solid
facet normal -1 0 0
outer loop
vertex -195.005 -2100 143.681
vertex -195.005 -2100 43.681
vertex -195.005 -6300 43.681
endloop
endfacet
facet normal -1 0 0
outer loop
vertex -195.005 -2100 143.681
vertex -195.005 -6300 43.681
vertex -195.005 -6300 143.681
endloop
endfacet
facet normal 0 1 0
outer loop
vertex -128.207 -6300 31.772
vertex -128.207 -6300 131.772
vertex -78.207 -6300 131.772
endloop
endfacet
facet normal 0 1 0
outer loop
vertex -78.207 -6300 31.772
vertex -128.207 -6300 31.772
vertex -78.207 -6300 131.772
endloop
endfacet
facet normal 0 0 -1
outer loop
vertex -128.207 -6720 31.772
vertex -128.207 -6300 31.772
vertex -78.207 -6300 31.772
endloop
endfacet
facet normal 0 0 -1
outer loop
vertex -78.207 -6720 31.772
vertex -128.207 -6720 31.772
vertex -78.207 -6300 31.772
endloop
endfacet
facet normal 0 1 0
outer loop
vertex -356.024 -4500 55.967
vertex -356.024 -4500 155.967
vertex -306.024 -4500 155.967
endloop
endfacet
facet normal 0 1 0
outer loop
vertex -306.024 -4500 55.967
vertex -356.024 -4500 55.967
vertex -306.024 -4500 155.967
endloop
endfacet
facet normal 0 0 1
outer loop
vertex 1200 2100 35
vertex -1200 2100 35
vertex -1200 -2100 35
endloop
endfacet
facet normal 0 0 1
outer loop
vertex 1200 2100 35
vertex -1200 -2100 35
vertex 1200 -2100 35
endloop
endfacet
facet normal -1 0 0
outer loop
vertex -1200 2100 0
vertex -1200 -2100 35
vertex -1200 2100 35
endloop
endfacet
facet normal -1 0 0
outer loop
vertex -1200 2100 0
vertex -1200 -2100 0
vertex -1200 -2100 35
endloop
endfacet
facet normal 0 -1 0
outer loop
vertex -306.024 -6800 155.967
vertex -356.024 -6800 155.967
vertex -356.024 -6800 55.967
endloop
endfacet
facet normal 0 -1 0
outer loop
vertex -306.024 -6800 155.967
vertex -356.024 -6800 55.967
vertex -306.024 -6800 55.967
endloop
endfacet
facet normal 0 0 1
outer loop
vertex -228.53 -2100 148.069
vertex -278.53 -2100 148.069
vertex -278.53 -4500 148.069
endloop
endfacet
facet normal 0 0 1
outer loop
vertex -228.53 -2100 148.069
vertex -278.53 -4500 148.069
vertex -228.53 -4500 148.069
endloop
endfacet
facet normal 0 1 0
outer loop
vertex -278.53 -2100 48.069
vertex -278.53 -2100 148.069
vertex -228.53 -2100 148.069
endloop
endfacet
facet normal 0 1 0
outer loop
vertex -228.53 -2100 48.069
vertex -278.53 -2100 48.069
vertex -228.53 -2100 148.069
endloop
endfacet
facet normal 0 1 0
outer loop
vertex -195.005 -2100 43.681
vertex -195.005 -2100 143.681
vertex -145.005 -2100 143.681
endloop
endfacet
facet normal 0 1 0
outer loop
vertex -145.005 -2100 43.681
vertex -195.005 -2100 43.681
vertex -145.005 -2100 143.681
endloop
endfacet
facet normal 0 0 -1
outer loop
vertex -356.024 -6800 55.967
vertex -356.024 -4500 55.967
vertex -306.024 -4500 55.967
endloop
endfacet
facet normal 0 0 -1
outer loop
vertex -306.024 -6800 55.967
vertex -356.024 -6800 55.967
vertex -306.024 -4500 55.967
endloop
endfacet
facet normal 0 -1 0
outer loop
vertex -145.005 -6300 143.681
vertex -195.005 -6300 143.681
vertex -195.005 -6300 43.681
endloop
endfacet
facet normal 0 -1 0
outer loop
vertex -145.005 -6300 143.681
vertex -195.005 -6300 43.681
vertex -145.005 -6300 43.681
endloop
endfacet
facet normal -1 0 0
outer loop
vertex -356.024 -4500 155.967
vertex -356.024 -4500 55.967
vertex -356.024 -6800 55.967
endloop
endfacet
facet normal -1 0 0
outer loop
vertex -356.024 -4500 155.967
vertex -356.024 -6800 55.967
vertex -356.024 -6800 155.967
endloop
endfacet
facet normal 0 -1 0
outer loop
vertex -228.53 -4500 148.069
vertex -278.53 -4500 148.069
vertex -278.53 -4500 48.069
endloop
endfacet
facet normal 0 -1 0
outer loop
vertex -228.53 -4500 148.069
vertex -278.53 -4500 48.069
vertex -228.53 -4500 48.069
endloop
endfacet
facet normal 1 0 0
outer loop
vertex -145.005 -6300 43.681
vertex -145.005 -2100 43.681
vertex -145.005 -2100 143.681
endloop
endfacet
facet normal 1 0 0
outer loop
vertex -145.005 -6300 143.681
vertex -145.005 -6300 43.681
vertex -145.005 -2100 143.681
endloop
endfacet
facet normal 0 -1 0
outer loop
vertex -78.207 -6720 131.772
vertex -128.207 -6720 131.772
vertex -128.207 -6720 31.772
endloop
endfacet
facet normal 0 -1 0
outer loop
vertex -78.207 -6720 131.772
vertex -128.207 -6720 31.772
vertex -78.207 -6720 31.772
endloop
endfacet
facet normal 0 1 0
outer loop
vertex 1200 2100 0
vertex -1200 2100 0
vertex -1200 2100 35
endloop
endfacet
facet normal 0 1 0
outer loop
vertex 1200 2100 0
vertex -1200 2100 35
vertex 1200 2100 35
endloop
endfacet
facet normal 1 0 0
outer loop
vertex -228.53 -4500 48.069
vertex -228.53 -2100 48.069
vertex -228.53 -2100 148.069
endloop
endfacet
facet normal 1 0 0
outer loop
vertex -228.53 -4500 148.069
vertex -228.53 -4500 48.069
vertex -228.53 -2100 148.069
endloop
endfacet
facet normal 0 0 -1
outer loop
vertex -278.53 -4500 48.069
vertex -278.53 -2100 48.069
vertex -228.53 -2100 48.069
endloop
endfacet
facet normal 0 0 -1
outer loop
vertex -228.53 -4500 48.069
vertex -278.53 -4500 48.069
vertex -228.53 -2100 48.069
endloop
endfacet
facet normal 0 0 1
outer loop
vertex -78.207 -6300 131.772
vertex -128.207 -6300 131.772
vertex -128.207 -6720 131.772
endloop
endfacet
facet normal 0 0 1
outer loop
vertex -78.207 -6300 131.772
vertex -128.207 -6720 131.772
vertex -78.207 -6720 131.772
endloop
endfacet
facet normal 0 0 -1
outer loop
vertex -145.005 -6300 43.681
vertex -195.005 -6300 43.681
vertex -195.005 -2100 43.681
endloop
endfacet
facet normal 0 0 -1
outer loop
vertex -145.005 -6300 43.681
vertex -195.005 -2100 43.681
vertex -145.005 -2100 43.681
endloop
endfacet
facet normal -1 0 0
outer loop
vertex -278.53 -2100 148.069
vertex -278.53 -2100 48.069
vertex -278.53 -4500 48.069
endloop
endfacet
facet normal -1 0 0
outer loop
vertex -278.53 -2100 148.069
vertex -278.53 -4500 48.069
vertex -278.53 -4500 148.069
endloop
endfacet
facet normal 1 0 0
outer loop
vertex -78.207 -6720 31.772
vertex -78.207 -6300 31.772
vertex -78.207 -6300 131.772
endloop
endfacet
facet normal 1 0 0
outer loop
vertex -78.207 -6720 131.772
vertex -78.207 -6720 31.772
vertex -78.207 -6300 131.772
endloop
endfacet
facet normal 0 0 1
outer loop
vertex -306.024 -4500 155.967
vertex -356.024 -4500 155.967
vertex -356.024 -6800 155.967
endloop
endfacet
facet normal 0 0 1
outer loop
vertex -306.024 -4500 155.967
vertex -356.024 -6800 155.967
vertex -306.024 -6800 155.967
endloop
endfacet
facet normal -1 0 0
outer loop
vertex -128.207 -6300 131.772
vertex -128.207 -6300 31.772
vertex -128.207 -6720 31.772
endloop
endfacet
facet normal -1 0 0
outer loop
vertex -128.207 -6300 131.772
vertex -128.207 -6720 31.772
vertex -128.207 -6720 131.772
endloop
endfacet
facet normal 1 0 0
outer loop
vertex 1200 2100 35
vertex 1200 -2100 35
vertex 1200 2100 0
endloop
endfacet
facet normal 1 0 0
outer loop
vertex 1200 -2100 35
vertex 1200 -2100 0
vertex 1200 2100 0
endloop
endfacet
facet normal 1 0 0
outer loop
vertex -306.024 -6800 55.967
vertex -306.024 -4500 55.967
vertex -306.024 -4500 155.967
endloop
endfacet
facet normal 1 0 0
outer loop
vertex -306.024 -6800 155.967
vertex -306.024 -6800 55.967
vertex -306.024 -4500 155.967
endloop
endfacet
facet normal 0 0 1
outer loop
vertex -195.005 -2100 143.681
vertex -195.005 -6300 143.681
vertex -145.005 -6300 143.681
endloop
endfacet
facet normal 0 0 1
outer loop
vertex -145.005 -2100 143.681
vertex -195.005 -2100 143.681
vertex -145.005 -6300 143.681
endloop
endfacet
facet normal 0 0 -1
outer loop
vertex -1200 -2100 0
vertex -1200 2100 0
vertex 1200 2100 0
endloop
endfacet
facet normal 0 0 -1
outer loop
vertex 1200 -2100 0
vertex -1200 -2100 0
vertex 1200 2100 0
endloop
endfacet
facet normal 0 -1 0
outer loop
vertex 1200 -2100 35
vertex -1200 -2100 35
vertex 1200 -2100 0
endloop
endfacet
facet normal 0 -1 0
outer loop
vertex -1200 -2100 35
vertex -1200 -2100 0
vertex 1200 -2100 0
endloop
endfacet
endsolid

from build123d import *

# Parameters (mm, degrees)
F0_W      = 2400
F0_H      = 4200
F1_DEPTH  = 10
F2_W      = 2400
F2_H      = 4200
F4_DEPTH  = 25
F3_W      = 50
F3_H      = 100
F6_DEPTH  = 4200
F7_W      = 50
F7_H      = 100
F8_DEPTH  = 2400
F9_W      = 50
F9_H      = 100
F10_DEPTH = 420
F11_W     = 50
F11_H     = 100
F12_DEPTH = 2300


with BuildPart() as f1:
    # F0 (on Top) → F1 (new body)
    with BuildSketch(Plane.XY):
        Rectangle(F0_W, F0_H)
    extrude(amount=F1_DEPTH)

    # F2 (on face) → F4 (join)
    with BuildSketch(Plane.XY.offset(10)):
        Rectangle(F2_W, F2_H)
    extrude(amount=F4_DEPTH)


with BuildPart() as f6:
    # F3 (on face) → F6 (new body)
    with BuildSketch(Plane.XZ.offset(2100)):
        with Locations((-170.005275, 93.681164)):
            Rectangle(F3_W, F3_H)
    extrude(amount=F6_DEPTH)


with BuildPart() as f8:
    # F7 (on face) → F8 (new body)
    with BuildSketch(Plane.XZ.offset(2100)):
        with Locations((-253.530486, 98.069087)):
            Rectangle(F7_W, F7_H)
    extrude(amount=F8_DEPTH)


with BuildPart() as f10:
    # F9 (on face) → F10 (new body)
    with BuildSketch(Plane.XZ.offset(6300)):
        with Locations((-103.206538, 81.771708)):
            Rectangle(F9_W, F9_H)
    extrude(amount=F10_DEPTH)


with BuildPart() as f12:
    # F11 (on face) → F12 (new body)
    with BuildSketch(Plane.XZ.offset(4500)):
        with Locations((-331.024458, 105.966724)):
            Rectangle(F11_W, F11_H)
    extrude(amount=F12_DEPTH)


solid = Compound([f1.part, f6.part, f8.part, f10.part, f12.part])
